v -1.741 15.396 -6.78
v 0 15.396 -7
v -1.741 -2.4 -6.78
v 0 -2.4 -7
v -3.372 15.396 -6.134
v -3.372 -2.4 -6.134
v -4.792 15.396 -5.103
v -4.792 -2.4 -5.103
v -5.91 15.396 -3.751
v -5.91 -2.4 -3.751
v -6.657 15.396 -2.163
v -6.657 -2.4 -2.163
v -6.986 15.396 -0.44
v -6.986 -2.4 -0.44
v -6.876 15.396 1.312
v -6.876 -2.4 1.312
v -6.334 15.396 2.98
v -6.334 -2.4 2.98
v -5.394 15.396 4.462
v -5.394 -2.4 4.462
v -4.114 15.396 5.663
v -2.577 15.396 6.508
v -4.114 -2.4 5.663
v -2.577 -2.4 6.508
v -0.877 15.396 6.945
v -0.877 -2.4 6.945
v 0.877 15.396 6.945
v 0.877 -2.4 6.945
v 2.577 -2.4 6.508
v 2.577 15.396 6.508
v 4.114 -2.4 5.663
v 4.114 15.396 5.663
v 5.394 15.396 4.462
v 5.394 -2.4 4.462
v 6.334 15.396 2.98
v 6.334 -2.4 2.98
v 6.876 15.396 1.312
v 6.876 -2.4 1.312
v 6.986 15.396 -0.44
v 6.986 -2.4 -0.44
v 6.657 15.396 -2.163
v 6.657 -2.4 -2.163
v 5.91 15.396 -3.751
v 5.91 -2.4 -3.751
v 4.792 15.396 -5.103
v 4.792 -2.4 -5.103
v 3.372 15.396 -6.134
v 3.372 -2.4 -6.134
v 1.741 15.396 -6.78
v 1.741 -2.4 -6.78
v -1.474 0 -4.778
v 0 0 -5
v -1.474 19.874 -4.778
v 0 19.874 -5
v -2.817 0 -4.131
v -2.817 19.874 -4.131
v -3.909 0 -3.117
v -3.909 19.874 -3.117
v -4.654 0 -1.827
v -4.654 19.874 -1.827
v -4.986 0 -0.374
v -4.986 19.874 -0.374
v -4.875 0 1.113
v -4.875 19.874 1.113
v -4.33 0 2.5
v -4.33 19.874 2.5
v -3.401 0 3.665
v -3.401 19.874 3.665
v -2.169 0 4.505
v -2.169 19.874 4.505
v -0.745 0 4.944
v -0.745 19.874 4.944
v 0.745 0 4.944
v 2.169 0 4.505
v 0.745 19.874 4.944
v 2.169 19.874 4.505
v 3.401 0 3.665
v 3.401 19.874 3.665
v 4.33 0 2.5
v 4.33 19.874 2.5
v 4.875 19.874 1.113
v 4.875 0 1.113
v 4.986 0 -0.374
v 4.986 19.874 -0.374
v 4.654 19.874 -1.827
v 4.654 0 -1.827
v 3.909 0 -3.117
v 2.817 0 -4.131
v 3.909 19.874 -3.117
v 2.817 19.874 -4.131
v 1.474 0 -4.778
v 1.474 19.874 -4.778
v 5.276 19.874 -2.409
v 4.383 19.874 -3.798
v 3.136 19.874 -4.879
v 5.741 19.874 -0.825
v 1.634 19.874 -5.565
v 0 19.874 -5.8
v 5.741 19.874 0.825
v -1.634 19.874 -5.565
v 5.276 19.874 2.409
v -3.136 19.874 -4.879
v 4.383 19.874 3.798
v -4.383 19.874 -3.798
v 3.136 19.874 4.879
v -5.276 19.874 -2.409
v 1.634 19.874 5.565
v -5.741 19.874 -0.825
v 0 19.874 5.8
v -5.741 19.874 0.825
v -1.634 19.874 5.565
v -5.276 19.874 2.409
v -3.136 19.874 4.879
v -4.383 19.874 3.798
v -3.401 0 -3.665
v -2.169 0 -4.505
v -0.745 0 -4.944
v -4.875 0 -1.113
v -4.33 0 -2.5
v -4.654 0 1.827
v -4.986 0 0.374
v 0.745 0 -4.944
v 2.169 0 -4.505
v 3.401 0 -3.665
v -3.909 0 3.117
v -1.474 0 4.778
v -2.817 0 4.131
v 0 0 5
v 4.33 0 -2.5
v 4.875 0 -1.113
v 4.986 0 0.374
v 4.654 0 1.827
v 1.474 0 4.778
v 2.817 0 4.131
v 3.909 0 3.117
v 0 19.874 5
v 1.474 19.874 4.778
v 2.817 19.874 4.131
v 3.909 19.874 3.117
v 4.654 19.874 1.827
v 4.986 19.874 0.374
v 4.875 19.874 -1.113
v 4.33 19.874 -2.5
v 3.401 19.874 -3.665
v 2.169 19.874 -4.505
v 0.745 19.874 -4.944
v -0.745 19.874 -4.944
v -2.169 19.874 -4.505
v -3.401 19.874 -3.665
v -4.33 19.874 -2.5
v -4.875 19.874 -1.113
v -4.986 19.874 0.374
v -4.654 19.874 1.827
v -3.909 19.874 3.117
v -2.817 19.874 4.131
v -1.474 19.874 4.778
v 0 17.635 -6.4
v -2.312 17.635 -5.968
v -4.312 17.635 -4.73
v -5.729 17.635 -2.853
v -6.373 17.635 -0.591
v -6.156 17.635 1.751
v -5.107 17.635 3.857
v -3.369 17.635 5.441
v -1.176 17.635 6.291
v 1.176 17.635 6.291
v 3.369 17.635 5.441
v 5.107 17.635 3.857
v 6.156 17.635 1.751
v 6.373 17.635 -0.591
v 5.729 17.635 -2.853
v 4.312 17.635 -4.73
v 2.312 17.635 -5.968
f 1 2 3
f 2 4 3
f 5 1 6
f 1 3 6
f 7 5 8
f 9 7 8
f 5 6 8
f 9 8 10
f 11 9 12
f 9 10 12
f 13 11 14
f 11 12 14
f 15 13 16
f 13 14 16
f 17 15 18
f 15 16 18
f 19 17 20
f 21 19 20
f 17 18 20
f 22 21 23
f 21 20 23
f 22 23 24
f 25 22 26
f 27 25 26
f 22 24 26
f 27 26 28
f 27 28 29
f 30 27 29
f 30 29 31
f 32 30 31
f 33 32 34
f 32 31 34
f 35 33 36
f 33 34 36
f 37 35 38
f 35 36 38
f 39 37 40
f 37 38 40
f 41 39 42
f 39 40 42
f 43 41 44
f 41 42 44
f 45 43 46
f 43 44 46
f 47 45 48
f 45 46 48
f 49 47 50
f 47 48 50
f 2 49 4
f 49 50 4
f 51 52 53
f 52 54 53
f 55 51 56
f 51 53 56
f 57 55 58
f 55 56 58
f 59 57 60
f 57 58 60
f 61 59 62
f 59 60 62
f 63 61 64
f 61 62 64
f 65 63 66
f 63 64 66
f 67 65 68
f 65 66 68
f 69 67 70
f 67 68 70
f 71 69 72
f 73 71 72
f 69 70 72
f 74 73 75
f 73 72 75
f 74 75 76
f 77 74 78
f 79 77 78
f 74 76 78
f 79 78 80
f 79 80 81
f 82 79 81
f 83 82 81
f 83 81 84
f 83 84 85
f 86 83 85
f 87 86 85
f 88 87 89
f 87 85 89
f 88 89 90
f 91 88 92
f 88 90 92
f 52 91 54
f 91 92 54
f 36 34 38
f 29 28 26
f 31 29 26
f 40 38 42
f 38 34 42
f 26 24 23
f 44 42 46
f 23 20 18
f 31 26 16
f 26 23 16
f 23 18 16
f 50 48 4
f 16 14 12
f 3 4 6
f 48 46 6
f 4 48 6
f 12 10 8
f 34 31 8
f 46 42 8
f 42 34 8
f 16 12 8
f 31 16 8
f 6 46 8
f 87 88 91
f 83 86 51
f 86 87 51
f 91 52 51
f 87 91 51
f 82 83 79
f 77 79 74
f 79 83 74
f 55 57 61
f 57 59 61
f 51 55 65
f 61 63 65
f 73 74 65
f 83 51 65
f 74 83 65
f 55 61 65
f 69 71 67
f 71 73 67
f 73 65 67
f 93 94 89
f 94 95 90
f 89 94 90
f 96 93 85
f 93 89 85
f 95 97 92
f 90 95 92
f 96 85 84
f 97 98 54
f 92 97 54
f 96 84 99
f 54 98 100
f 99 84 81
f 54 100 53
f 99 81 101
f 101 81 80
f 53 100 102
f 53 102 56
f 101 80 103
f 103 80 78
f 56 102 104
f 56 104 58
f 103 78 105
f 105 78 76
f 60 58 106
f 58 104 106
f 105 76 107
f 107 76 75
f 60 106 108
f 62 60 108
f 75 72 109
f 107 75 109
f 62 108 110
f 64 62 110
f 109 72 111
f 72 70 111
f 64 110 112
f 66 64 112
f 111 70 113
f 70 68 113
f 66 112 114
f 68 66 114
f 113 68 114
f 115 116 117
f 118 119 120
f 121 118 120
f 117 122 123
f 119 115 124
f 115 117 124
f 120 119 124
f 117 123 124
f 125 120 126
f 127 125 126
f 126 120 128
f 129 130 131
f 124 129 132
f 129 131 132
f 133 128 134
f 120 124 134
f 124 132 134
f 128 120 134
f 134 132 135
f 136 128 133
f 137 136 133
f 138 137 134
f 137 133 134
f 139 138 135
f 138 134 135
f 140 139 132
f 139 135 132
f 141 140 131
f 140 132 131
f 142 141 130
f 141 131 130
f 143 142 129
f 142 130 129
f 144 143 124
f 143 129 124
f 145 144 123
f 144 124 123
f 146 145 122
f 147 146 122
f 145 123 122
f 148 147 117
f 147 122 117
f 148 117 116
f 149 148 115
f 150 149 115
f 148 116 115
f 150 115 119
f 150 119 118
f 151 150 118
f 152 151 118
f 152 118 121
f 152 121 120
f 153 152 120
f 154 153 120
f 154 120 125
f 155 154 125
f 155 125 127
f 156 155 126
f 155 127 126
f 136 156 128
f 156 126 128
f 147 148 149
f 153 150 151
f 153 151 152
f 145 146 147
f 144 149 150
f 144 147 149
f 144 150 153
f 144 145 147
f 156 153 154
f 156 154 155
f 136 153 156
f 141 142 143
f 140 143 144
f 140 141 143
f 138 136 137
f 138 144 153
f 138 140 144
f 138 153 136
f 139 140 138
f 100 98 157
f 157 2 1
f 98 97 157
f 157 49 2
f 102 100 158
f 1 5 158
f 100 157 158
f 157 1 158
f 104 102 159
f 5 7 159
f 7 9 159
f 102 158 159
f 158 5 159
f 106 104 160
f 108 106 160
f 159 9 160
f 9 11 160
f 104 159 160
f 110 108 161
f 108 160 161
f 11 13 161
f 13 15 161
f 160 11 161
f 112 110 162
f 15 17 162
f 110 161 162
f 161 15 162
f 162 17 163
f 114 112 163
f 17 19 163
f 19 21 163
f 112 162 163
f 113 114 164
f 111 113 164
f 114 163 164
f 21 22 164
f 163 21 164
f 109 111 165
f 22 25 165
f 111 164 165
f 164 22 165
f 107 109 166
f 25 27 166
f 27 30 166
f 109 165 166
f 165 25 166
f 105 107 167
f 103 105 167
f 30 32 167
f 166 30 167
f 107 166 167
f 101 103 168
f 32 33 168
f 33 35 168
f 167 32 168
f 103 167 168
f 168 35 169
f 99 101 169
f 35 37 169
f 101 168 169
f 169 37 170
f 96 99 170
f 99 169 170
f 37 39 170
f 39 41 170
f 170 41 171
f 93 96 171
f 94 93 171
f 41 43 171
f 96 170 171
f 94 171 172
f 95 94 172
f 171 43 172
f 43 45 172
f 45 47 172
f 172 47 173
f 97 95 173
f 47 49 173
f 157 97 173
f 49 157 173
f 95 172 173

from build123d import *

# Parameters (mm, degrees)
SKETCH1_R           = 5
BOSS_EXTRUDE1_DEPTH = 19.874493393


with BuildPart() as part:
    # Sketch1 → Boss-Extrude1 (new body)
    with BuildSketch(Plane(origin=(0, 0, 0), x_dir=(1, 0, 0), z_dir=(0, 1, 0))):
        with Locations(Location((0, 0, 0), (0, 0, 270))):
            Circle(SKETCH1_R)
    extrude(amount=BOSS_EXTRUDE1_DEPTH)


with BuildPart() as body_2:
    # Sketch2 → Revolve1 (revolve)
    with BuildSketch(Plane.XY, mode=Mode.PRIVATE) as revolve1_sk:
        Polygon((0, 0), (-5, 0), (-5, 19.874493393), (-5.8, 19.874493393), (-7, 15.396032424), (-7, -2.4), (0, -2.4), align=None)
    revolve(revolve1_sk.sketch.rotate(Axis((0, 0, 0), (0, 1, 0)), 270), axis=Axis((0, 0, 0), (0, 1, 0)))


solid = Compound([part.part, body_2.part])
